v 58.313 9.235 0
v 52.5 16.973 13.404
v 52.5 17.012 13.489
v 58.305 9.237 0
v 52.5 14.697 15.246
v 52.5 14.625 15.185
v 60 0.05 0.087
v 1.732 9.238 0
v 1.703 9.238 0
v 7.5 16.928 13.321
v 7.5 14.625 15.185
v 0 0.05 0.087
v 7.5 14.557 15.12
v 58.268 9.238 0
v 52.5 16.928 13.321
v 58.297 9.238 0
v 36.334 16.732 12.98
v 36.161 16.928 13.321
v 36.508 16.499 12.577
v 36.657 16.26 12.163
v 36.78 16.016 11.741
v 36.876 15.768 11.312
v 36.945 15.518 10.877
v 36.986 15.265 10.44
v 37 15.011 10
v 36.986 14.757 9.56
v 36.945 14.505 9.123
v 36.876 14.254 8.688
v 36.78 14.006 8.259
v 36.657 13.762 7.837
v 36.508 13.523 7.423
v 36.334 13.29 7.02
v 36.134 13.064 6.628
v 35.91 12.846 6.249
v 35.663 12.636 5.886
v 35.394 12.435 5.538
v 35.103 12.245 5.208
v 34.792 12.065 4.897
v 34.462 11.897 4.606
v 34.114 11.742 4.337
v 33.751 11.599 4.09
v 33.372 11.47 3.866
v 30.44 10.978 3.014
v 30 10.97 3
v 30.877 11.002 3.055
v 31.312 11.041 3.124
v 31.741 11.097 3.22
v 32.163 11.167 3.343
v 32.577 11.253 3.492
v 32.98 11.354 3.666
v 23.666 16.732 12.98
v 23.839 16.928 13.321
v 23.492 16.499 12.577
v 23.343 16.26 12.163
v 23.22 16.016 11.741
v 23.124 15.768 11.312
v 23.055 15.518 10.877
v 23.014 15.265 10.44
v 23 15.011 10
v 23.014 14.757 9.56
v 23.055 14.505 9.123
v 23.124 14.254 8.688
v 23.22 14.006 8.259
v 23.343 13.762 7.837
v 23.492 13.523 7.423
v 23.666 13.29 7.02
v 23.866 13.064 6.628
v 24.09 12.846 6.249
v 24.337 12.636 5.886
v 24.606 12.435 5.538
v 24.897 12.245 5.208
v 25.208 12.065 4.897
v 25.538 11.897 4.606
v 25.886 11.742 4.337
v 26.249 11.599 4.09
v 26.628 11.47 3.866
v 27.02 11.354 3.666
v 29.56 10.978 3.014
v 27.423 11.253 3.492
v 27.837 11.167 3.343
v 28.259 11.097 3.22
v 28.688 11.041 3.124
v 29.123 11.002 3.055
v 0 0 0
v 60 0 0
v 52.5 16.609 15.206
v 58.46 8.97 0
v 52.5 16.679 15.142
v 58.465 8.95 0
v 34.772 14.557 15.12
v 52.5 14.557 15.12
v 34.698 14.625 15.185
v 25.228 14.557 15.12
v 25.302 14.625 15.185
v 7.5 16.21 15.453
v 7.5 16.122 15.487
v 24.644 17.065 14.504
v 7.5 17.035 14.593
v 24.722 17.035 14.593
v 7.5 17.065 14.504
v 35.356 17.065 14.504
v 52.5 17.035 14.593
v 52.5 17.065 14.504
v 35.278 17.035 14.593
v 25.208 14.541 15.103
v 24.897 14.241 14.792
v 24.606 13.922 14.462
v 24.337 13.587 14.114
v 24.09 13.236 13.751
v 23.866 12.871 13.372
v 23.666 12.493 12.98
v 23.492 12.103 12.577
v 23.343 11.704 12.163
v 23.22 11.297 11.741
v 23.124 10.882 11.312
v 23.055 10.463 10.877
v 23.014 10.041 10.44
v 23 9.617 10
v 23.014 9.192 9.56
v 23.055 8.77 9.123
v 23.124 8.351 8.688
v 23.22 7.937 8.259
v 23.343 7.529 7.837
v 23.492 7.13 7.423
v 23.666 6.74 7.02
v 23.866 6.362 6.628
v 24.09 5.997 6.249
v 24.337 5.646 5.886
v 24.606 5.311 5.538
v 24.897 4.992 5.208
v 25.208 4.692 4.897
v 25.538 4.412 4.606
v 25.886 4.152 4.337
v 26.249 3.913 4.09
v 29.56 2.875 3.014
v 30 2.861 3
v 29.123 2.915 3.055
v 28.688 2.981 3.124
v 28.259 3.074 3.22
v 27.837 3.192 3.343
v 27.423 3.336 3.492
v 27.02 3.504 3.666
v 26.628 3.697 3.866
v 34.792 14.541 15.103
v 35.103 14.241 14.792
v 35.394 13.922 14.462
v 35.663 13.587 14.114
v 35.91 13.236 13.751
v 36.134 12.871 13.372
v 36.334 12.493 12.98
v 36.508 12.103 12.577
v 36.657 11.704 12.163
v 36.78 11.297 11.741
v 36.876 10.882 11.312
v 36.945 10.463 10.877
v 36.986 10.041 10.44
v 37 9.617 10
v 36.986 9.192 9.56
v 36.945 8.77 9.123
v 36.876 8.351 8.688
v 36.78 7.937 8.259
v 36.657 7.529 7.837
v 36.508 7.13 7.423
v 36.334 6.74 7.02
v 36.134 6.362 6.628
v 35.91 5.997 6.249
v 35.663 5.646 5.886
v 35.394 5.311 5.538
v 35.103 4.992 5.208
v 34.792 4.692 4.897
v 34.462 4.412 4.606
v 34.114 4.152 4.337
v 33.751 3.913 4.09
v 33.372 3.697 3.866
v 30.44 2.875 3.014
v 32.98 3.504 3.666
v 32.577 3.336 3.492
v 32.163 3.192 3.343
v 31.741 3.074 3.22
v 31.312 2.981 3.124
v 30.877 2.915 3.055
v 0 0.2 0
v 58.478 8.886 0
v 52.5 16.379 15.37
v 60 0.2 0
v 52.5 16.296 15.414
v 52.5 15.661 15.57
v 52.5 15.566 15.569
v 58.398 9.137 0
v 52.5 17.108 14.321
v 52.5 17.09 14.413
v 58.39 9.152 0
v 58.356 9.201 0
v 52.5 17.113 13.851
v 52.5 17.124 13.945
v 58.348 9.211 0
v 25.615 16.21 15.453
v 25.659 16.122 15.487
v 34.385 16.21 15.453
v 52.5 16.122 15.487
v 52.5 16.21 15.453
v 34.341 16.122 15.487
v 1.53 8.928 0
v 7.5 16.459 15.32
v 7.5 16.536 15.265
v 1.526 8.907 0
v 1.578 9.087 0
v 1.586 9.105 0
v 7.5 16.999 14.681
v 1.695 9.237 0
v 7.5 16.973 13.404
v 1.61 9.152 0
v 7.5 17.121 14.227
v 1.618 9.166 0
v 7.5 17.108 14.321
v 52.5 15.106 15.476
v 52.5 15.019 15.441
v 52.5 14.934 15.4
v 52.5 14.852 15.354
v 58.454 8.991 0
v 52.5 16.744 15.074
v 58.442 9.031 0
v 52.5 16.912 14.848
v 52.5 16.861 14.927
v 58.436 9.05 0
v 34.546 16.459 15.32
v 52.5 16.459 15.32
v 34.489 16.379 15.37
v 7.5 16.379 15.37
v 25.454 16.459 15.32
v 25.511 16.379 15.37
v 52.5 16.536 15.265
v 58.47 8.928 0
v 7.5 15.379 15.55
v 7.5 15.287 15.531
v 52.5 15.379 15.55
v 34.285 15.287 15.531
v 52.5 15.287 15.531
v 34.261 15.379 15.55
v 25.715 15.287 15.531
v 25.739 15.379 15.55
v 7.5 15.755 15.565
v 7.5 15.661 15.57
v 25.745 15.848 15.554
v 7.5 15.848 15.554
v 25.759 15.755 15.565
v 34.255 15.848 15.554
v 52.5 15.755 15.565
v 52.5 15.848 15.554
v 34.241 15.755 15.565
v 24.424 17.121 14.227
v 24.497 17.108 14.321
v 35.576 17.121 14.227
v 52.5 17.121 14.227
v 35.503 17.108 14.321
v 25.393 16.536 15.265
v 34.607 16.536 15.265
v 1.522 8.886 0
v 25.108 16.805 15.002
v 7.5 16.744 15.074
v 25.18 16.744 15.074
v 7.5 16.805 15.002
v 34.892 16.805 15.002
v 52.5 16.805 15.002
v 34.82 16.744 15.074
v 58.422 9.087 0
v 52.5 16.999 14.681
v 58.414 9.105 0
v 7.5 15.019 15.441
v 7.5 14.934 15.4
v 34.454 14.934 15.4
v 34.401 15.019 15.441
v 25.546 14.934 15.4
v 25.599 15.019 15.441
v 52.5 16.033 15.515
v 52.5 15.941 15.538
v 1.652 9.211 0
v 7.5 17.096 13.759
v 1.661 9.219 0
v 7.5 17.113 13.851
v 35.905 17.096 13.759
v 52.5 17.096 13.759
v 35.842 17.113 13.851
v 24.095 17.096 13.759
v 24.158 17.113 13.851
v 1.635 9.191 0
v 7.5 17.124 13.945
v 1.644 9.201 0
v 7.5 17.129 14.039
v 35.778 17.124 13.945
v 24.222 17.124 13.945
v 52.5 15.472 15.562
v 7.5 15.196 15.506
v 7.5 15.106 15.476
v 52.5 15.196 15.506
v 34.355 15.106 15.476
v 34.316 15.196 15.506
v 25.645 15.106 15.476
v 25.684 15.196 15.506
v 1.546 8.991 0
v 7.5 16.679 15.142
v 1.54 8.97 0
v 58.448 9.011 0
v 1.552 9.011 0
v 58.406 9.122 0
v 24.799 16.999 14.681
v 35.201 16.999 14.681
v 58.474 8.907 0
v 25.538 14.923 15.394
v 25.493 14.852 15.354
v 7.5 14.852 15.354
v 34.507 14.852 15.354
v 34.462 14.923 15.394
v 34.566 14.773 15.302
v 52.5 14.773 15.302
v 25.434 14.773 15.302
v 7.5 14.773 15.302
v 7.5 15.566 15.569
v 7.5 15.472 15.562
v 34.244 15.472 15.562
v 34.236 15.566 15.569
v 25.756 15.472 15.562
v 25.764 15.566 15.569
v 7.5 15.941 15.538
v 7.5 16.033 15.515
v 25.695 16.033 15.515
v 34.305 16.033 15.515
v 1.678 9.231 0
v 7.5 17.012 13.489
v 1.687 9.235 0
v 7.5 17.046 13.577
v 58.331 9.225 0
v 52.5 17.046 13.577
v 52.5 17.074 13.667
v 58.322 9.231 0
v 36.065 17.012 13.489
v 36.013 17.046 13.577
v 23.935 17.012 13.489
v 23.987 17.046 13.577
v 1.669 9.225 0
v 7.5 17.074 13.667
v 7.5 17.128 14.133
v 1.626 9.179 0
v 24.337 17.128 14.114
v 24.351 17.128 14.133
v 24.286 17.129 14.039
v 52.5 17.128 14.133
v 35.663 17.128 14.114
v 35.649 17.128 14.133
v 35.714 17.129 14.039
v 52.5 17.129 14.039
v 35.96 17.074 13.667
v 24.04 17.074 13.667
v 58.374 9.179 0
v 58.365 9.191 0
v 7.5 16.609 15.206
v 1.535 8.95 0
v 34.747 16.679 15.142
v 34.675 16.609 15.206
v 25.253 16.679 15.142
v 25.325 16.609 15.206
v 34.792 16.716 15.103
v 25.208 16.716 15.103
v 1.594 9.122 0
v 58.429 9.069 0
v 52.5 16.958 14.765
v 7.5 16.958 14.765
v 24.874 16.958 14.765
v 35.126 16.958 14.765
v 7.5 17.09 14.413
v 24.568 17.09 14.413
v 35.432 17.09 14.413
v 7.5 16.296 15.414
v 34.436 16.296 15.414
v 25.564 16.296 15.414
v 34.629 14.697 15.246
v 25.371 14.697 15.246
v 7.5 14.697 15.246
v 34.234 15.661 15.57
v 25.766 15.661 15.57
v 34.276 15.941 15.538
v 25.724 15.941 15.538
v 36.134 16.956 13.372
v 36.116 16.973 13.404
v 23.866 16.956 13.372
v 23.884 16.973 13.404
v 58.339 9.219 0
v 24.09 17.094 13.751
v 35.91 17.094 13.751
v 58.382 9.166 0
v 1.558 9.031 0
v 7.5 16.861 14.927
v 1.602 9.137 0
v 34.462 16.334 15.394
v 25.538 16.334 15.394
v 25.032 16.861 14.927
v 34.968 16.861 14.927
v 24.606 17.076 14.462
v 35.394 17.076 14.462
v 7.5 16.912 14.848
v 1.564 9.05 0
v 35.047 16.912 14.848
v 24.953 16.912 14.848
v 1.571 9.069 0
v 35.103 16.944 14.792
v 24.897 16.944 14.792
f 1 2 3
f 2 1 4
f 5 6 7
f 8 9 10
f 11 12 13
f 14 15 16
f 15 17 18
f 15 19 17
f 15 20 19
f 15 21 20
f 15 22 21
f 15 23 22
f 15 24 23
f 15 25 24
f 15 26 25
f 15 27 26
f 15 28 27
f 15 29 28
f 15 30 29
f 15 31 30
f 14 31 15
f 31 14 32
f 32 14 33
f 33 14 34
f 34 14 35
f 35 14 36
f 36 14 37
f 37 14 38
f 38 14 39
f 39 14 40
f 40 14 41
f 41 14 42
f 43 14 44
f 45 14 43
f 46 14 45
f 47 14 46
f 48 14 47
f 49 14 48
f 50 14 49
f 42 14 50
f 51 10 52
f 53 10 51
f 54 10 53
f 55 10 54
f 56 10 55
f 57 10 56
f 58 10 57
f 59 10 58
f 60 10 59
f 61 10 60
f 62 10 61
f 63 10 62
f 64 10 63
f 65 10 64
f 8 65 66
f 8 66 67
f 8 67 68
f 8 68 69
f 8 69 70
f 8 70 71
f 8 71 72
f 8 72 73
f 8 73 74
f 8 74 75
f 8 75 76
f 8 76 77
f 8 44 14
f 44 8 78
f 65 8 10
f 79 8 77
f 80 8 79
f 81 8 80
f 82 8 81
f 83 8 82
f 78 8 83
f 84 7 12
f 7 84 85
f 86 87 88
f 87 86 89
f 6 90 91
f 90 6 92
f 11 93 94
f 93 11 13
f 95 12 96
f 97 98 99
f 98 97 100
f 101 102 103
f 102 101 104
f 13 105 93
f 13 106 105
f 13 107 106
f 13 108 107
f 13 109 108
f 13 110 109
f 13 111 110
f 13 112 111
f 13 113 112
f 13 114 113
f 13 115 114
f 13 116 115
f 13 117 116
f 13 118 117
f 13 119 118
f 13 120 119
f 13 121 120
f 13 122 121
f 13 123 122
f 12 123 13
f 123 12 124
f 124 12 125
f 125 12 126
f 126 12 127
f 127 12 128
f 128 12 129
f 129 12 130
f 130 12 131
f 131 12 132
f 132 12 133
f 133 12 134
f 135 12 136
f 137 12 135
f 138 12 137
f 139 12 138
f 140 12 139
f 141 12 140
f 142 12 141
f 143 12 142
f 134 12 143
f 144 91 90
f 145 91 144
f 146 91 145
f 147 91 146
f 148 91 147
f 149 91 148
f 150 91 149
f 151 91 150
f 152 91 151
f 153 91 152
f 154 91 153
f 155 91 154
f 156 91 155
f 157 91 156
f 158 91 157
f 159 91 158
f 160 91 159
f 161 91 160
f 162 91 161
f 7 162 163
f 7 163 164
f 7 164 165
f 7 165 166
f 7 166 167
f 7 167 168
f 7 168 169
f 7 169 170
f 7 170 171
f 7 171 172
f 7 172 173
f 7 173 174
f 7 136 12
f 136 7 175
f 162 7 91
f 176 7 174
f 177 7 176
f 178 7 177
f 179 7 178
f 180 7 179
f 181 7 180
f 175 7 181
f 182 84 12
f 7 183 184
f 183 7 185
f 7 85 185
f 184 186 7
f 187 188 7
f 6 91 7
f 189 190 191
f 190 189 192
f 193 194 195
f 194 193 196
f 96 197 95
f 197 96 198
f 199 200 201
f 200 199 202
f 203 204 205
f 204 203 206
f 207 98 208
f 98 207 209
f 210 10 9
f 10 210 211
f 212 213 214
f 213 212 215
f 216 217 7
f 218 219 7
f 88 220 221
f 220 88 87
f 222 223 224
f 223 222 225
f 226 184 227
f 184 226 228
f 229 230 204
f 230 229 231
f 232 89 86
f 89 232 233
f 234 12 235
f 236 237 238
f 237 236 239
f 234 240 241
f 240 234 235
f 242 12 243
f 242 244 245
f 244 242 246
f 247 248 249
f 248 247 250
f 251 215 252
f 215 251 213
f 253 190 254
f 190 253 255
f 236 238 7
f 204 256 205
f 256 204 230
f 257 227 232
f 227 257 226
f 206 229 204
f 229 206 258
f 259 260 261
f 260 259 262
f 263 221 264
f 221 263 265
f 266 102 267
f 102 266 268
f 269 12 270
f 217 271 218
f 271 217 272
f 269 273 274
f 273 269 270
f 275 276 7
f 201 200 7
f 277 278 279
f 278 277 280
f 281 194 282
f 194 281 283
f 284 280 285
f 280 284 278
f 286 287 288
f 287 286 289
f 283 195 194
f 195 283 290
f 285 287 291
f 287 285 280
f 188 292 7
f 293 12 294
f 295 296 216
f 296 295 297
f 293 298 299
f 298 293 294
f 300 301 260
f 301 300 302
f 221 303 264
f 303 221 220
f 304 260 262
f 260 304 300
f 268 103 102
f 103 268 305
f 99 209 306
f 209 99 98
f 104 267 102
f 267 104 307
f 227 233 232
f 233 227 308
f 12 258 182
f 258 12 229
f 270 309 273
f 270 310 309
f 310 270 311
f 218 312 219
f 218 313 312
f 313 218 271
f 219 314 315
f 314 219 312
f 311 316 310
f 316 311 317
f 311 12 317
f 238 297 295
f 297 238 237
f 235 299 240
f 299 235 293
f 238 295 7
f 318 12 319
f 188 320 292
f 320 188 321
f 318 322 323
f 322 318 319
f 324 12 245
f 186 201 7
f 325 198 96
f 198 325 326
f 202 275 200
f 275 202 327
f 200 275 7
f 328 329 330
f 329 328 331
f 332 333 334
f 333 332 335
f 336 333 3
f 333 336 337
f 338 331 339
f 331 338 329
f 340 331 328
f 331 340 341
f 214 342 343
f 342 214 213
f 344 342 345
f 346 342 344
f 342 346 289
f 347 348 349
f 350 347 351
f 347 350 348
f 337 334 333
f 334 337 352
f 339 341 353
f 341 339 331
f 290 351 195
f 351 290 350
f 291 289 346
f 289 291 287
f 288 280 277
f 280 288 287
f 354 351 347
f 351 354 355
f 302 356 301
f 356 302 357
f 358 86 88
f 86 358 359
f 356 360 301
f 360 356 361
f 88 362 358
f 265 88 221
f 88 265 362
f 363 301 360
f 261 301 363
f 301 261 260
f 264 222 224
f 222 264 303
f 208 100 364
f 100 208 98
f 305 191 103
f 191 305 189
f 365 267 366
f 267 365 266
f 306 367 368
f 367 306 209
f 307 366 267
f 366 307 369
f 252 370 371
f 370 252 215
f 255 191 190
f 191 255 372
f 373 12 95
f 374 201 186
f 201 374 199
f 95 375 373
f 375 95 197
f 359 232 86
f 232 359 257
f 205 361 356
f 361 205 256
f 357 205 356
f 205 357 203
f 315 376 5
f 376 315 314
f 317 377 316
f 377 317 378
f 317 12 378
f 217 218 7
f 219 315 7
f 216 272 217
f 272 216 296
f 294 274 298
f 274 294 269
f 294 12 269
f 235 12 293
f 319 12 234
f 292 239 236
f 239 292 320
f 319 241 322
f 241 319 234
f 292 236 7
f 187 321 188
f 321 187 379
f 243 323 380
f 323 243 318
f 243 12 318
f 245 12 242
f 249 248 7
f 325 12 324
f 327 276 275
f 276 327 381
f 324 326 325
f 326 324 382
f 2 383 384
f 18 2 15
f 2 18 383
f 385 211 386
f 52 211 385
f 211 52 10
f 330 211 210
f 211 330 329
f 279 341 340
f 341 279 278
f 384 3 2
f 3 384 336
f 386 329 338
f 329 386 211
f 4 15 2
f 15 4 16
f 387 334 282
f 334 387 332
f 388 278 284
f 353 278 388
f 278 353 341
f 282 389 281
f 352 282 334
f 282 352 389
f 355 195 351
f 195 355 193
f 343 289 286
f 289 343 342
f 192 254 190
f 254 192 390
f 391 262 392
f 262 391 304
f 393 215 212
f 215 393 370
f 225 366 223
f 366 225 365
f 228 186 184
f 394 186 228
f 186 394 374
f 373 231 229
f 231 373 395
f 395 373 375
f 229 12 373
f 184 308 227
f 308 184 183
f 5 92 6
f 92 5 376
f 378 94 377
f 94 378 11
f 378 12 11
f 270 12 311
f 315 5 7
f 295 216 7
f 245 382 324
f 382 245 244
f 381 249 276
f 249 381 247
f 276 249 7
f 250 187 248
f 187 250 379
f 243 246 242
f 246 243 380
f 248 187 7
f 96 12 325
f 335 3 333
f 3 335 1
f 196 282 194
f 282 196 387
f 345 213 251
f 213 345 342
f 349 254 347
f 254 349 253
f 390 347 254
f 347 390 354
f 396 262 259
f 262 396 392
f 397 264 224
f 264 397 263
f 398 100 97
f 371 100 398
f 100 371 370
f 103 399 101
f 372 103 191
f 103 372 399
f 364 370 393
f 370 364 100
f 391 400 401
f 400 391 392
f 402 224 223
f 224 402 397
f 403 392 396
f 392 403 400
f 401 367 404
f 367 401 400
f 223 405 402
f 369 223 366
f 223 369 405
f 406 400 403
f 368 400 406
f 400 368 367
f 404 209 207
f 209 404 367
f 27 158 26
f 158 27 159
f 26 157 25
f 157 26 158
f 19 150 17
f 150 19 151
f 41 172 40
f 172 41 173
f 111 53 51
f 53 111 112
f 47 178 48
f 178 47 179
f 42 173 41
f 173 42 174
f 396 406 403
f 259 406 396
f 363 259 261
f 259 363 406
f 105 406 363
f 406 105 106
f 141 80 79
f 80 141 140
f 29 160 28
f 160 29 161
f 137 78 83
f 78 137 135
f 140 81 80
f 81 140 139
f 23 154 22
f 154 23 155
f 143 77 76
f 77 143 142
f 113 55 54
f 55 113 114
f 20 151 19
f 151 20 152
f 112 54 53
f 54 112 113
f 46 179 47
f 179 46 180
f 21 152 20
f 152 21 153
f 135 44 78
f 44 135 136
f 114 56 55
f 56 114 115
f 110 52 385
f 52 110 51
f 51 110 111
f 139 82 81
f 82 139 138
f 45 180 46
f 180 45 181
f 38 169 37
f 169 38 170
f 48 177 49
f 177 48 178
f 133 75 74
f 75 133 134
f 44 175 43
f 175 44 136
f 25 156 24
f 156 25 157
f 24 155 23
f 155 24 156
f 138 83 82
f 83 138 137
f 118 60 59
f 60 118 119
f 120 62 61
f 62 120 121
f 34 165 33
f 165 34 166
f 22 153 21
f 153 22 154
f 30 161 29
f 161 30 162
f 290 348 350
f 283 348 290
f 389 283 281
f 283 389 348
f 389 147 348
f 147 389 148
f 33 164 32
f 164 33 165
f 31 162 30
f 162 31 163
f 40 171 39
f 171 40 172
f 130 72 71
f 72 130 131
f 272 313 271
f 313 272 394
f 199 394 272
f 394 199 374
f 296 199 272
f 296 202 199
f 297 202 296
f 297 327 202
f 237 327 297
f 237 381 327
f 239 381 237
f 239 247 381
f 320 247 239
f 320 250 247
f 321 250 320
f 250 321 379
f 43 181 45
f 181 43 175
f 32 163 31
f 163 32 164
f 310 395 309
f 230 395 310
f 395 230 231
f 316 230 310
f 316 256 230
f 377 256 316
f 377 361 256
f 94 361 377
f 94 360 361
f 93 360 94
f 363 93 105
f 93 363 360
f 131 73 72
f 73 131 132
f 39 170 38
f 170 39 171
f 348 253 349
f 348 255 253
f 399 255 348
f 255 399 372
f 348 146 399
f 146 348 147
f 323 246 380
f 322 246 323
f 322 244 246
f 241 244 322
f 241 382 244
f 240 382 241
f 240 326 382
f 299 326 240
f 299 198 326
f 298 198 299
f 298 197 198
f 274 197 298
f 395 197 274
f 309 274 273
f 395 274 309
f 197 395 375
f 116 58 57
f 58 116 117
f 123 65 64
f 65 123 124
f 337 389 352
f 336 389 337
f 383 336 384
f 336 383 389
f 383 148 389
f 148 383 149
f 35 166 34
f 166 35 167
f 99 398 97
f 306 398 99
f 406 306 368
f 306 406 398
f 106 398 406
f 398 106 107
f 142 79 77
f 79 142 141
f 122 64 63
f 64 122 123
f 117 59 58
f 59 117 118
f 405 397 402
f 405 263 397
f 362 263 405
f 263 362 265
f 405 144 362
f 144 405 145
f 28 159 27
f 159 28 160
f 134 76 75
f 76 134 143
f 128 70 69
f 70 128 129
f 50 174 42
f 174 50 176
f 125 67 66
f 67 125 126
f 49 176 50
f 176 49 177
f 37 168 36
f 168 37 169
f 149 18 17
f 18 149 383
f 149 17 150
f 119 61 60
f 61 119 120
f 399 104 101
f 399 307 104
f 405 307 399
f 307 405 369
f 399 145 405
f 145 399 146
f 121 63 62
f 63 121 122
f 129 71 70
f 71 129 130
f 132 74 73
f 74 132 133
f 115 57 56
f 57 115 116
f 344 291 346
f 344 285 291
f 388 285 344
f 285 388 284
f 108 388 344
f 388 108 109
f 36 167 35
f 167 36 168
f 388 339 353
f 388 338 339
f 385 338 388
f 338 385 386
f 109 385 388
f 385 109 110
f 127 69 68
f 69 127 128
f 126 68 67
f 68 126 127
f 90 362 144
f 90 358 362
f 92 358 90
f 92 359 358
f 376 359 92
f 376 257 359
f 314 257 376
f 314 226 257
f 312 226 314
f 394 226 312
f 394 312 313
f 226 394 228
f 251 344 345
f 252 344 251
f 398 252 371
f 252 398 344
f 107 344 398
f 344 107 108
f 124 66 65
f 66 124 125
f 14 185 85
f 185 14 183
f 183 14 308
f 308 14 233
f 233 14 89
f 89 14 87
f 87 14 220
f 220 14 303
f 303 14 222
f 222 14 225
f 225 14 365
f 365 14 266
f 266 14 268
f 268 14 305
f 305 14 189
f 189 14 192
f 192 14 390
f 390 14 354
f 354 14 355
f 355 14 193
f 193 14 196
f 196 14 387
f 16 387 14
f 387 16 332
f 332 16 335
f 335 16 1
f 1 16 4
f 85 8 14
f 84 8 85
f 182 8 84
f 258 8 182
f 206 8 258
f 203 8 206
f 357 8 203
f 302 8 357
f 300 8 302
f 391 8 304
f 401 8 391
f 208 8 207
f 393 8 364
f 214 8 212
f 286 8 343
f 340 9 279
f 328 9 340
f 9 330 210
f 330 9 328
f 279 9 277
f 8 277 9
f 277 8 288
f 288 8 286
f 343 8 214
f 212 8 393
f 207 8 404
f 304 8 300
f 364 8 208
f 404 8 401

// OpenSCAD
x=60;
x2=45;
y=8;
z=20;
t=3;
$fn=100;

difference(){
    rotate([-30,0,0])
    hull(){
        translate([(x-x2)/2,y-t/2,z])
        rotate([0,90,0])
        cylinder(d=t, h=x2);
        
        cube([x,y,.1]);        
    }
    
    translate([x/2,0,z/2])
    rotate([-90,0,0])
    cylinder(d=14, h=x2);

    translate([-.1, -.1, -20])
    cube([x+1,y+5,20]);        
    
}
